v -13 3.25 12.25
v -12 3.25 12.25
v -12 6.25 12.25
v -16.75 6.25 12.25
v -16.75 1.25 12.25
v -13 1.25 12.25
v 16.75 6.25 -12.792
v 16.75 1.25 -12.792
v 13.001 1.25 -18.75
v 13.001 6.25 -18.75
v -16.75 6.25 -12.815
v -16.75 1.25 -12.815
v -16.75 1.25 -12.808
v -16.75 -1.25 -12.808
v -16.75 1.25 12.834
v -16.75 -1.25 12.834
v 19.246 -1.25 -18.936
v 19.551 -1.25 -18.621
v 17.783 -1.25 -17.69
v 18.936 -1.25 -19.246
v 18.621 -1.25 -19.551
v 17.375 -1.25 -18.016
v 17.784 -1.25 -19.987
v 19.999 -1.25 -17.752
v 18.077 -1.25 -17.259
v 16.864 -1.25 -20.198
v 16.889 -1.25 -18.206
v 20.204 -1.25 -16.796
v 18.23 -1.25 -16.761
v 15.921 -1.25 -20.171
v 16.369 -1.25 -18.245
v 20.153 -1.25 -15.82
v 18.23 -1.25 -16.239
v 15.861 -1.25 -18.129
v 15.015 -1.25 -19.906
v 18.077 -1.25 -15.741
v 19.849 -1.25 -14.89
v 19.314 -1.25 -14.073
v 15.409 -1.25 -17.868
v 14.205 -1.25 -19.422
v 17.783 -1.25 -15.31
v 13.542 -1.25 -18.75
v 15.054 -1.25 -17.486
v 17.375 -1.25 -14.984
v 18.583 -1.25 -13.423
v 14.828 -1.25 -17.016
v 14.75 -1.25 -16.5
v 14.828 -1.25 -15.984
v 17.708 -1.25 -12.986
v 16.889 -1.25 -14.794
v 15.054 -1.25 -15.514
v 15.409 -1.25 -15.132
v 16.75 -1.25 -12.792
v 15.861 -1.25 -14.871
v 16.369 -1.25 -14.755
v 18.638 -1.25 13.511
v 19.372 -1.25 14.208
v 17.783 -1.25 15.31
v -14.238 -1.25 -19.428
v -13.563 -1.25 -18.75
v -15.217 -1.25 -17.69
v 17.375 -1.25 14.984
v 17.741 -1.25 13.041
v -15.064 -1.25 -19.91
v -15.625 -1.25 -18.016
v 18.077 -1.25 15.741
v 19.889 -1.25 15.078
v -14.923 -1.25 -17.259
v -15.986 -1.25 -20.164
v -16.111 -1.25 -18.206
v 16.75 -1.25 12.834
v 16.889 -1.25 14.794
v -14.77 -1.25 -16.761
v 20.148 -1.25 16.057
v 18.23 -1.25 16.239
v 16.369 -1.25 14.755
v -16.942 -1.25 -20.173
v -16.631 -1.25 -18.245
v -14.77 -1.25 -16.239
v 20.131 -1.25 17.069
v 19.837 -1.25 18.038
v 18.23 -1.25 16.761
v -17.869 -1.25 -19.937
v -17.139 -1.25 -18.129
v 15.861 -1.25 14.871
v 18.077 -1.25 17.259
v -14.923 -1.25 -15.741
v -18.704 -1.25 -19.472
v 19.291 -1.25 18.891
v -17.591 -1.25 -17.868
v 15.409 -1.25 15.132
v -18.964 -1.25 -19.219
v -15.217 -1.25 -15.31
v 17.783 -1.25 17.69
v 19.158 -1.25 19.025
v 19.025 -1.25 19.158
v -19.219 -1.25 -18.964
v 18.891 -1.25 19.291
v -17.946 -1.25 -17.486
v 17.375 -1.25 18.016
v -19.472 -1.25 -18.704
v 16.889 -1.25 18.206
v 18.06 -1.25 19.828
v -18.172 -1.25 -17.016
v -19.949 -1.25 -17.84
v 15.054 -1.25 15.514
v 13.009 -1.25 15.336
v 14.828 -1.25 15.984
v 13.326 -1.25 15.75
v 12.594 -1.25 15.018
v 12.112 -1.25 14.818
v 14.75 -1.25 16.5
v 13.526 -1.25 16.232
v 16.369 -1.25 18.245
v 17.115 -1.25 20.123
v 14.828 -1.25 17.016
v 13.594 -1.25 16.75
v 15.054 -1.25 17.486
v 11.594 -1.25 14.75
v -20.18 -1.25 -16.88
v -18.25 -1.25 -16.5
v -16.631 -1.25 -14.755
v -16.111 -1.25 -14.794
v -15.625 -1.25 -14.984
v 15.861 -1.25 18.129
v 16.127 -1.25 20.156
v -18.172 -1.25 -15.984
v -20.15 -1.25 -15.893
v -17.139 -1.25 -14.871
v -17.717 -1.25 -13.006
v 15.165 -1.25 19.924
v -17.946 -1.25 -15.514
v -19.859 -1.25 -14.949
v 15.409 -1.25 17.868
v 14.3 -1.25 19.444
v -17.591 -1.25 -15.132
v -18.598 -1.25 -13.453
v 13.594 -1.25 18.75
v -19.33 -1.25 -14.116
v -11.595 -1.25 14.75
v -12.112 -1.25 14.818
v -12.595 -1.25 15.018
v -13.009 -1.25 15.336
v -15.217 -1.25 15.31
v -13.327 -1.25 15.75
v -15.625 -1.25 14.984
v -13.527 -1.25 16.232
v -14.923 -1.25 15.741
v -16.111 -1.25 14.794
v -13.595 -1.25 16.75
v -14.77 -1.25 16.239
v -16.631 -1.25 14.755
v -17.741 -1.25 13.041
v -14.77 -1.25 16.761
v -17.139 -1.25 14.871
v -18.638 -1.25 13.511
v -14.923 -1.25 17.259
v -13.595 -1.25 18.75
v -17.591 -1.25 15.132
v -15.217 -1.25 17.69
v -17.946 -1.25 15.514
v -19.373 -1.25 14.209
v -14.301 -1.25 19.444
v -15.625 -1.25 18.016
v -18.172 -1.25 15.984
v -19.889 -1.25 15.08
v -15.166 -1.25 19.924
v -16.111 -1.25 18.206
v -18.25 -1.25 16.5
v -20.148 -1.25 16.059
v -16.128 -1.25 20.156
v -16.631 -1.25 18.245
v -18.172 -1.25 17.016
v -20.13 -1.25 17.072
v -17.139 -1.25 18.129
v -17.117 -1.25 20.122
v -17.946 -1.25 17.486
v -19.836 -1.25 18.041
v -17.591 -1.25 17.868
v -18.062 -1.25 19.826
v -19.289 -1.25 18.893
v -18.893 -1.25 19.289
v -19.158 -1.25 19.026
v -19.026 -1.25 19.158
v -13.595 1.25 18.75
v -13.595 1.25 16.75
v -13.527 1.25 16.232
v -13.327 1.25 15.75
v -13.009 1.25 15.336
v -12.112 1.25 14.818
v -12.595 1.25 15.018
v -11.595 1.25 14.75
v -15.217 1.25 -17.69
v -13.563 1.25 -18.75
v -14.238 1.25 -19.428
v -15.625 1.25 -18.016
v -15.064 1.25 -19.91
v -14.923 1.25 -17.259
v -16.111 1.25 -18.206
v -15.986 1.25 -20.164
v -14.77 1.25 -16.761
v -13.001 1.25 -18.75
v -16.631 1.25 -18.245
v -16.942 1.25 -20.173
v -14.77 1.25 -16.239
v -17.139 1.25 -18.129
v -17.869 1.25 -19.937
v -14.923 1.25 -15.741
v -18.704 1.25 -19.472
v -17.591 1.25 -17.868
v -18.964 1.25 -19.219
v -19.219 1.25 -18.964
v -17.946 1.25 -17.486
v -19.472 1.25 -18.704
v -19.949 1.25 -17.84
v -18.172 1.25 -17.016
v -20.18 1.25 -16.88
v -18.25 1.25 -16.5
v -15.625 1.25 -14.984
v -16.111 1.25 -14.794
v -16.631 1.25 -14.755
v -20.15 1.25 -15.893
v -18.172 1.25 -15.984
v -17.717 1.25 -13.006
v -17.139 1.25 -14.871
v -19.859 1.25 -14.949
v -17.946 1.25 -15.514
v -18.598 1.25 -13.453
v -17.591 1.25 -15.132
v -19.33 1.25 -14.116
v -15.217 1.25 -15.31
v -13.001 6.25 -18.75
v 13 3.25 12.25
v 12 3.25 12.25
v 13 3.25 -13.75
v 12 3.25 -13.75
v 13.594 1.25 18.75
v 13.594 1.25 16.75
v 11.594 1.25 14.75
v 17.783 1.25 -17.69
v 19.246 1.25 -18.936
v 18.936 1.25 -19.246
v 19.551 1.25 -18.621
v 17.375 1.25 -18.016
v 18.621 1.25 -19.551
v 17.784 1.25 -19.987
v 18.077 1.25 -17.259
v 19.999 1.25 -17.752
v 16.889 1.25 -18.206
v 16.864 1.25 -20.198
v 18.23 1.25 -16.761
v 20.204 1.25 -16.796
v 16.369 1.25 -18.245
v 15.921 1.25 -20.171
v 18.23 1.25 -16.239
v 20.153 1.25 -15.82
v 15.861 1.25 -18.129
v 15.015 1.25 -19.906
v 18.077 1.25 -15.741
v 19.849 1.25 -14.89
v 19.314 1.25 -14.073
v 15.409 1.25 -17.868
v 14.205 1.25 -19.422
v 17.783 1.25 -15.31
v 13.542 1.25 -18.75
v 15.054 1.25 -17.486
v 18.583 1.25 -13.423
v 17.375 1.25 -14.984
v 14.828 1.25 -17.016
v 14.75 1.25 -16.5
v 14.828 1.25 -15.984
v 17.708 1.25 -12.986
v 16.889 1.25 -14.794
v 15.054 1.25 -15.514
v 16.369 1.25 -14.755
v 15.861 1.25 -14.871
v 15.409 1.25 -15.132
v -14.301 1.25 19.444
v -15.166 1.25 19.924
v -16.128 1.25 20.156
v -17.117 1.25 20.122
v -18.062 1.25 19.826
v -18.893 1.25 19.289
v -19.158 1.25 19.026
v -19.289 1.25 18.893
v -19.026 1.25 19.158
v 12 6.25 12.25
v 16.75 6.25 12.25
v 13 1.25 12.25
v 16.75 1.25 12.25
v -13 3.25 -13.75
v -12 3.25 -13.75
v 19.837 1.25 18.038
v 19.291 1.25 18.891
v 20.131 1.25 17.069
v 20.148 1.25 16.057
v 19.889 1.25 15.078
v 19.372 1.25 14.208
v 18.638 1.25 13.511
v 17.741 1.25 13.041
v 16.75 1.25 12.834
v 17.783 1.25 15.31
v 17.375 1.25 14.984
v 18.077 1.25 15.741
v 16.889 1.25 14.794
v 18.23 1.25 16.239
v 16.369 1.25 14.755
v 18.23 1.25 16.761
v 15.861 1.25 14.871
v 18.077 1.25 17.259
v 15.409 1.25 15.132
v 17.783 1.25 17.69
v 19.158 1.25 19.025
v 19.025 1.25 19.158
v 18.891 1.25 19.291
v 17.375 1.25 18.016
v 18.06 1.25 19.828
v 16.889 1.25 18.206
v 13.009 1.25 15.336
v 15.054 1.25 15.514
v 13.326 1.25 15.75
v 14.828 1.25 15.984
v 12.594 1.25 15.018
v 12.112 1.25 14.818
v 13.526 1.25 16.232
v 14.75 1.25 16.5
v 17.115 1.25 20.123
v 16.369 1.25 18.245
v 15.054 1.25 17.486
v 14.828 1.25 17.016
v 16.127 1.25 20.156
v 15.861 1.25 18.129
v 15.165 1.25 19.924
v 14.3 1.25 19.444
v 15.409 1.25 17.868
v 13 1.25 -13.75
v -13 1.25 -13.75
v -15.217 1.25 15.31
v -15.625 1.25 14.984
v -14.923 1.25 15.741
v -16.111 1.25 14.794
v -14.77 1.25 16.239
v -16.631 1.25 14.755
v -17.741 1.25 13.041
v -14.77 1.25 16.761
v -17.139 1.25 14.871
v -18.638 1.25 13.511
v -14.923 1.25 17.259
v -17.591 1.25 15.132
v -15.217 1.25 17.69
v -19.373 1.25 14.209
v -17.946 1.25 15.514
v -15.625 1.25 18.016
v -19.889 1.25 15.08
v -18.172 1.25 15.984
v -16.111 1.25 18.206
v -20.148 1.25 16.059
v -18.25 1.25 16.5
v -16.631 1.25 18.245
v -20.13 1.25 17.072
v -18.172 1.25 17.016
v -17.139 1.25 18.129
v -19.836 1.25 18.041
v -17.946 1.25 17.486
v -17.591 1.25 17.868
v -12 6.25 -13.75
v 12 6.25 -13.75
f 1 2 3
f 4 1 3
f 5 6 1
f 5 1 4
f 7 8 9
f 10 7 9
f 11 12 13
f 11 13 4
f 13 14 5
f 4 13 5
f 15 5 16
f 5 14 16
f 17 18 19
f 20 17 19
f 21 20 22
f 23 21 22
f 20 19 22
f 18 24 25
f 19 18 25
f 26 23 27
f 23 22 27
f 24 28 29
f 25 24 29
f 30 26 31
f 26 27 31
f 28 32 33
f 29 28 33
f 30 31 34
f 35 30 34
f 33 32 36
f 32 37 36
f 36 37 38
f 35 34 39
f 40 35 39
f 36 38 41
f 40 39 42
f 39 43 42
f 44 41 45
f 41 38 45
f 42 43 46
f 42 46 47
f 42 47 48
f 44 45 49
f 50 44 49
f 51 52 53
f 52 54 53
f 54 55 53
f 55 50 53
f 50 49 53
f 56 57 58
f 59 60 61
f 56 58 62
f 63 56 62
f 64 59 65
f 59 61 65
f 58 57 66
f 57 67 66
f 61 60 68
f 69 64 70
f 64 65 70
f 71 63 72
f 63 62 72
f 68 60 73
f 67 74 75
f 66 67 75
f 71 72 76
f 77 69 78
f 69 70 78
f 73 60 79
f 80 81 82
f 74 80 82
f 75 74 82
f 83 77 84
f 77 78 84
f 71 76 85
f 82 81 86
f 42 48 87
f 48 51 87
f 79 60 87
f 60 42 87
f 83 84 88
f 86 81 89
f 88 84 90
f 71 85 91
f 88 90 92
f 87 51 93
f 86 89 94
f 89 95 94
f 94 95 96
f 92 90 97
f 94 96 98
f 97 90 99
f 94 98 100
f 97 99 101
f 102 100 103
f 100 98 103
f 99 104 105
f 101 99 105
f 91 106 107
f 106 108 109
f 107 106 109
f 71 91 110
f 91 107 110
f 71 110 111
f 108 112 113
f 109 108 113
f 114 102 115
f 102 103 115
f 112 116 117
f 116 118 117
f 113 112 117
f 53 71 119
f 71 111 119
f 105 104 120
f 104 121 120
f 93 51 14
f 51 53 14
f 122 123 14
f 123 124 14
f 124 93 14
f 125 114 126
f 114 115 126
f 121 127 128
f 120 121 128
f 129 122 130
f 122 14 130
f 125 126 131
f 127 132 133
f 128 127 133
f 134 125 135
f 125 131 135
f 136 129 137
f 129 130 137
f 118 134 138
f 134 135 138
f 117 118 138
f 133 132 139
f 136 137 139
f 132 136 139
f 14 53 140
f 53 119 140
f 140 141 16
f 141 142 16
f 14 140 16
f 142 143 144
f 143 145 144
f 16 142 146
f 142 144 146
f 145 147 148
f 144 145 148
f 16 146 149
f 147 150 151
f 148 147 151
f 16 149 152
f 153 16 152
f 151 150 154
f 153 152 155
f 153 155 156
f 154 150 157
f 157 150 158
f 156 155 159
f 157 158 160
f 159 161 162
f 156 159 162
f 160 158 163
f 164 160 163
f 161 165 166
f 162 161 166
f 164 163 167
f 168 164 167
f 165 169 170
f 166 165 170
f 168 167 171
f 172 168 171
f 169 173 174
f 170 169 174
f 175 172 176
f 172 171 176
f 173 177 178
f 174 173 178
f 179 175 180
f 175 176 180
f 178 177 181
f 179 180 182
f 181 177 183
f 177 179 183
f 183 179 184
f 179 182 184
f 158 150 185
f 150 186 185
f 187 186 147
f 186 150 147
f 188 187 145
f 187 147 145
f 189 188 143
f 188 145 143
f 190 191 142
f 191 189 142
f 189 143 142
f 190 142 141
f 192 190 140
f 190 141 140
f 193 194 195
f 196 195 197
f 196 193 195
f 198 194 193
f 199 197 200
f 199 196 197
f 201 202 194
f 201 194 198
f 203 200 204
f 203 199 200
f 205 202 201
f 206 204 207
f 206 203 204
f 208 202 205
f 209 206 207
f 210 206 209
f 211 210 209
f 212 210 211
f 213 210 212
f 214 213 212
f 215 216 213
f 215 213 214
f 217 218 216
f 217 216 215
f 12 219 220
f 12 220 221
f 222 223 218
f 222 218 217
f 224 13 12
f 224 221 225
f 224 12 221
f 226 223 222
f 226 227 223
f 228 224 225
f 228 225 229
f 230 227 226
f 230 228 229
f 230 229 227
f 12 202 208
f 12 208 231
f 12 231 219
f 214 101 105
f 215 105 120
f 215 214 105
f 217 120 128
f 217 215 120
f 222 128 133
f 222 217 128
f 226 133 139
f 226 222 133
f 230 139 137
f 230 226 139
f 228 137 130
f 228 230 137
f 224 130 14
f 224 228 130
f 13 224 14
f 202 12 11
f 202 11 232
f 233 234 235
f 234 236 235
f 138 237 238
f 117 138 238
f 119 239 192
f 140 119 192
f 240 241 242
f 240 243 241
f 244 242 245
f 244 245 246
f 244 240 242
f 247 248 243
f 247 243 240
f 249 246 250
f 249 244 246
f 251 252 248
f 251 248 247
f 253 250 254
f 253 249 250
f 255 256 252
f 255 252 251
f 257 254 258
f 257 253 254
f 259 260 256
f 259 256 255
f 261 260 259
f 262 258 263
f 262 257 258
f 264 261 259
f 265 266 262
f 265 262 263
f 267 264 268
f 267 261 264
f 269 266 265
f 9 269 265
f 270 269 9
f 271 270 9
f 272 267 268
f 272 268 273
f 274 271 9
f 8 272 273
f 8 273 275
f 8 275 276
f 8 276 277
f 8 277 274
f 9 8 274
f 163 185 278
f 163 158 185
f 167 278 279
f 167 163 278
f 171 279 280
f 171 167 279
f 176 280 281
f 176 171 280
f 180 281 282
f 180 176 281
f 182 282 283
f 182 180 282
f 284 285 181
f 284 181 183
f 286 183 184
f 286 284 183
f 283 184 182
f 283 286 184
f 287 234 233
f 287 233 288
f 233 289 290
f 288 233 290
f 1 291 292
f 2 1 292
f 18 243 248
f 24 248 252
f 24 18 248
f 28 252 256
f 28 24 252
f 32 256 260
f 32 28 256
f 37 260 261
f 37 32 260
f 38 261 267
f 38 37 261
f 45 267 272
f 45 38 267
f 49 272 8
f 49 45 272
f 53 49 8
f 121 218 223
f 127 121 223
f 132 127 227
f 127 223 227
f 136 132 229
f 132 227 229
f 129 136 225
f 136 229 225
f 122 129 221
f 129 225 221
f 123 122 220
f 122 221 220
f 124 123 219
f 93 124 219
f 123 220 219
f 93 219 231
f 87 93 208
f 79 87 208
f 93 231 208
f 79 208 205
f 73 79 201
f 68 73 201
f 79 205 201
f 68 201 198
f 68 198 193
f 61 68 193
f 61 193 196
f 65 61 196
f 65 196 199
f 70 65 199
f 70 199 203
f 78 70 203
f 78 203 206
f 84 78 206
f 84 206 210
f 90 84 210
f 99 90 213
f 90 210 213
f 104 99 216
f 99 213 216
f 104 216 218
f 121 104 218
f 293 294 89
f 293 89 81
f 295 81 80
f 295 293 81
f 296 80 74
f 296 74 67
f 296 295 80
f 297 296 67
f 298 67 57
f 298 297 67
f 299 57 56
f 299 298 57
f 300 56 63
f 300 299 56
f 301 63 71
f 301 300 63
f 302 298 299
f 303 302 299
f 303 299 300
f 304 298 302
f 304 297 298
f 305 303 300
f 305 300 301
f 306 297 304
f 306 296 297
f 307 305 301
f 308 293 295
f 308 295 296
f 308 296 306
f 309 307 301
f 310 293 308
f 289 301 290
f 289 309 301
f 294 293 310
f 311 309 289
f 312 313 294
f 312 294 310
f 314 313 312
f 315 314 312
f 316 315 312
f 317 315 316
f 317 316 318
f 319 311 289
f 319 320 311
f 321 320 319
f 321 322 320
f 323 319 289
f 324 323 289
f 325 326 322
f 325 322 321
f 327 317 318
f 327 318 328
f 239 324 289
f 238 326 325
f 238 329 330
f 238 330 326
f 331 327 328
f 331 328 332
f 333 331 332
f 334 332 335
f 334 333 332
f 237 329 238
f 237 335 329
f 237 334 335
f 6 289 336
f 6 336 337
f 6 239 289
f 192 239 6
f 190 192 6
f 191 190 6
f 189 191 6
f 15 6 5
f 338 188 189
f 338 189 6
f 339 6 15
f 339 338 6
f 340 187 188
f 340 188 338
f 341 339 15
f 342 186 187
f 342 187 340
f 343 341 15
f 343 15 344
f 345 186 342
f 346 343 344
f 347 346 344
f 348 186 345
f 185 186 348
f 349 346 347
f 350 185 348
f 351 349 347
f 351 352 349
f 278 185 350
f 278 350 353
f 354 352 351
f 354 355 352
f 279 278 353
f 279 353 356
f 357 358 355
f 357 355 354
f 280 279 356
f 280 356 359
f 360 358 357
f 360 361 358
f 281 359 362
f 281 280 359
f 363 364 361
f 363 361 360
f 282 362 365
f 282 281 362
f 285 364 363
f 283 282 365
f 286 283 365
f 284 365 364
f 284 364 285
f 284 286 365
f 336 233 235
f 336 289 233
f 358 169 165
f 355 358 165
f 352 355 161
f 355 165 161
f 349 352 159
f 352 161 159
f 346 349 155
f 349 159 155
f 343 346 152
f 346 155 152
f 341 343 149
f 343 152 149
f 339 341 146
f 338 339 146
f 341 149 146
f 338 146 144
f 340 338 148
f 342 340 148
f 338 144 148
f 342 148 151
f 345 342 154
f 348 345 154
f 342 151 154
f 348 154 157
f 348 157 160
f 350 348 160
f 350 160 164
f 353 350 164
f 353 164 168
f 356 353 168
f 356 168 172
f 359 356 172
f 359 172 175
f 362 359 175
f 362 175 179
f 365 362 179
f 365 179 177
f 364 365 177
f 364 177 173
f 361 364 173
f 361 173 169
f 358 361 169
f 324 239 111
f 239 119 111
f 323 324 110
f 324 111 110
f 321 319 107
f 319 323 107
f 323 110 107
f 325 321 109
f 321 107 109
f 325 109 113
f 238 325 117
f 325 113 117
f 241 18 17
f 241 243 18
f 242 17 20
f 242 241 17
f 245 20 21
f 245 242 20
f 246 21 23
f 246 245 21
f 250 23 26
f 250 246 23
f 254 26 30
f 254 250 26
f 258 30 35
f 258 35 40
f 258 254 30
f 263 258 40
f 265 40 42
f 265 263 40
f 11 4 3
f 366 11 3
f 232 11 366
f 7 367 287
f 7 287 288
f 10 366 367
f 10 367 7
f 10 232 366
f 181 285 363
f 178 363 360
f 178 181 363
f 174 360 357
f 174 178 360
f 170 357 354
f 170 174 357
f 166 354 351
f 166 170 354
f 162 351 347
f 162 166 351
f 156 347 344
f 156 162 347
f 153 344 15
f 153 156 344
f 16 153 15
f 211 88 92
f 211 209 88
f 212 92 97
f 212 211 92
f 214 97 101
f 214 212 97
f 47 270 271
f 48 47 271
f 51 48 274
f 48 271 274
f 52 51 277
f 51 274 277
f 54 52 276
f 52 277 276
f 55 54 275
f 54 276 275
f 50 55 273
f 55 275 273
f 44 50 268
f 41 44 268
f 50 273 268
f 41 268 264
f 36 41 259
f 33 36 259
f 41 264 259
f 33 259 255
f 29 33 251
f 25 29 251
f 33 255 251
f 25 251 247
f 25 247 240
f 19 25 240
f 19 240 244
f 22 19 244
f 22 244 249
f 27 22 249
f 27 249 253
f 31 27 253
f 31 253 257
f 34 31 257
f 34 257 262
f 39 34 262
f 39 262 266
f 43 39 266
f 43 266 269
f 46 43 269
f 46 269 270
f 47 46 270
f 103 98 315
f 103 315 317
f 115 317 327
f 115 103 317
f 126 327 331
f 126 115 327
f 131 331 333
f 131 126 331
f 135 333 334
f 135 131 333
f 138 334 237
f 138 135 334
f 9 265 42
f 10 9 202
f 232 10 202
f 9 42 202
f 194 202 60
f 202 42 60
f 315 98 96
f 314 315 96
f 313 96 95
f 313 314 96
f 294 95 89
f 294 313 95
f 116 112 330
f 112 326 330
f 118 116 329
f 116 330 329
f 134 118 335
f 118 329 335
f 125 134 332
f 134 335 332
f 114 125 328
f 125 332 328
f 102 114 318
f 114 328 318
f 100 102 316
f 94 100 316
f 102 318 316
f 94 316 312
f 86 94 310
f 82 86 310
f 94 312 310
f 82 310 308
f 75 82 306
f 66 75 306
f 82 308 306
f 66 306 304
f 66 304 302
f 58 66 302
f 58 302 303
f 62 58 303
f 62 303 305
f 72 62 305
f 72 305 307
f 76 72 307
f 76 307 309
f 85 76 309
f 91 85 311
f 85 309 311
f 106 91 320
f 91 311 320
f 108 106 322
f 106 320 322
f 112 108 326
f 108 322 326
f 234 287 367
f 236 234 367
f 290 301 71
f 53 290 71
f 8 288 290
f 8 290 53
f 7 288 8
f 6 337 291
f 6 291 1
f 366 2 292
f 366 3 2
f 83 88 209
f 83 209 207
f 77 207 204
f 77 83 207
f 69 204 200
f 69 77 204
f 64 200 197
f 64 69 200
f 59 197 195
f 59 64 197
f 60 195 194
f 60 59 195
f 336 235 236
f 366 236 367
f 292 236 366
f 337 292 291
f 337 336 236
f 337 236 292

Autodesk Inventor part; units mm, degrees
ref_plane "YZ Plane" through (0, 0, 0) normal (1, 0, 0) x (0, 1, 0)
sketch "Skizze1" plane through (0, 0, 0) normal (0, 1, 0) x (-1, 0, 0)
  circle A0 centre (0, 0) radius 30
  circle A1 centre (0, 0) radius 27
  dimension "d0" = 60
  dimension "d1" = 54
extrude "Extrusion1" add sketch "Skizze1" along normal mid plane 10
sketch "Skizze5" plane through (0, 0, 0) normal (0, 1, 0) x (-1, 0, 0)
  line L0 (12.75, -14.75) -> (-12.75, -14.75)
  line L1 (-12.75, -14.75) -> (-12.75, 14.75)
  line L2 (-12.75, 14.75) -> (12.75, 14.75)
  line L3 (12.75, 14.75) -> (12.75, -14.75)
  line L4 (49.4097, 0) -> (-52.5504, 0) construction
  line L5 (0, -53.7913) -> (0, 68.1535) construction
  line L6 (-16.75, -18.75) -> (16.75, -18.75)
  line L7 (16.75, -18.75) -> (16.75, 18.75)
  line L8 (16.75, 18.75) -> (-16.75, 18.75)
  line L9 (-16.75, 18.75) -> (-16.75, -18.75)
  point P0 (0, 0)
  dimension "d33" = 29.5
  dimension "d34" = 25.5
  dimension "d35" = 4
extrude "Extrusion5" add sketch "Skizze5" along normal mid plane 2.5 contours L0 L1 L2 L3 | L9 L8 L7 L6
ref_plane "Arbeitsebene1" through (0, 0, 0) normal (0, 1, 0) x (-1, 0, 0)
chamfer "Fase1" distance 1 angle 45 2 edges at (30, 5, 0) (30, -5, 0)
sketch "Skizze2" plane through (0, 0, 0) normal (0, 1, 0) x (-1, 0, 0)
  line L0 (0, 42.2301) -> (0, -36.7007) construction
  line L1 (32.6355, 0) -> (-32.6355, 0) construction
  line L2 (16.5, 34.419) -> (16.5, -40.3324) construction
  line L3 (-16.5, 35.4304) -> (-16.5, -34.8157) construction
  line L4 (23.5881, 16.5) -> (-32.0387, 16.5) construction
  line L5 (23.5881, -16.5) -> (-39.8541, -16.5) construction
  circle A0 centre (16.5, -16.5) radius 1.75
  circle A1 centre (16.5, 16.5) radius 1.75
  circle A2 centre (-16.5, 16.5) radius 1.75
  circle A3 centre (-16.5, -16.5) radius 1.75
  circle A4 centre (-16.5, 16.5) radius 3.6749
  circle A5 centre (-16.5, -16.5) radius 3.7161
  circle A6 centre (16.5, -16.5) radius 3.7
  circle A7 centre (16.5, 16.5) radius 3.6747
  point P0 (0, 0)
  dimension "d8" = 33
  dimension "d9" = 33
  dimension "d10" = 3.5
  dimension "d11" = 3.5
  dimension "d12" = 3.5
  dimension "d13" = 3.5
extrude "Extrusion2" add sketch "Skizze2" along normal mid plane 2.5
ref_plane "Arbeitsebene2" through (0, 0, -30.5) normal (0, 0, 1) x (1, 0, 0)
extrude "Extrusion6" cut sketch "Skizze2" against normal mid plane 3 contours A0 | A1 | A2 | A3
sketch "Skizze12" plane through (0, 5, 0) normal (0, 1, 0) x (1, 0, 0)
  circle A0 centre (0, 0) radius 27
  circle A1 centre (0, 0) radius 31.5802
extrude "Extrusion13" cut sketch "Skizze12" against normal blind 10
sketch "Skizze13" plane through (0, 1.25, 0) normal (0, 1, 0) x (1, 0, 0)
  line L0 (-13.5947, -18.75) -> (13.5944, -18.75) projected
  line L1 (-13.5947, -18.75) -> (13.5944, -18.75)
  line L2 (13.5944, -18.75) -> (13.5944, -14.75)
  line L3 (13.5944, -14.75) -> (-13.5947, -14.75)
  line L4 (-13.5947, -14.75) -> (-13.5947, -18.75)
  point P0 (0, 0)
  dimension "d58" = 4
extrude "Extrusion14" cut sketch "Skizze13" against normal blind 3
fillet "Rundung4" radius 2 2 edges at (13.5944, 0, 14.75) (-13.5947, 0, 14.75)
sketch "Skizze14" plane through (0, 1.25, 0) normal (0, 1, 0) x (1, 0, 0)
  line L0 (-13, -12.25) -> (13, -12.25)
  line L1 (13, -12.25) -> (13, 13.75)
  line L2 (13, 13.75) -> (-13, 13.75)
  line L3 (-13, 13.75) -> (-13, -12.25)
  line L4 (0, -43.7267) -> (0, 49.5069) construction
  line L5 (-24.7381, 0) -> (29.5694, 0) construction
  line L6 (13.5425, 18.75) -> (-13.5627, 18.75) construction
  line L7 (-13, -12.25) -> (-16.75, -12.25)
  line L8 (-16.75, 12.8084) -> (-16.75, -12.8338) projected
  line L9 (-16.75, -12.25) -> (-16.75, 12.815)
  line L10 (-16.75, 12.815) -> (-13.0013, 18.75)
  line L11 (13, -12.25) -> (16.75, -12.25)
  line L12 (16.75, -12.8336) -> (16.75, 12.7924) projected
  arc A0 (16.75, 12.7924) -> (19.551, 18.6215) centre (16.5, 16.5) ccw projected
  line L13 (16.75, -12.25) -> (16.75, 12.7924)
  line L14 (16.75, 12.7924) -> (13.0013, 18.75)
  line L15 (13.0013, 18.75) -> (-13.0013, 18.75)
  point P0 (0, 0)
  dimension "d62" = 26
  dimension "d63" = 26
  dimension "d64" = 5
extrude "Extrusion15" add sketch "Skizze14" along normal blind 5 contours L7 L8 L9 L10 L15 L14 L12 L11 L1 L2 L3
sketch "Skizze15" plane through (0, 6.25, 0) normal (0, 1, 0) x (1, 0, 0)
  line L0 (-13, 13.75) -> (-13, -12.25) projected
  line L1 (13, 13.75) -> (-13, 13.75) projected
  line L2 (-13, -12.25) -> (-12, -12.25)
  line L3 (-12, -12.25) -> (-12, 13.75)
  line L4 (-12, 13.75) -> (-13, 13.75)
  line L5 (-13, 13.75) -> (-13, -12.25)
  line L6 (13, -12.25) -> (16.75, -12.25) projected
  line L7 (13, -12.25) -> (12, -12.25)
  line L8 (12, -12.25) -> (12, 13.75)
  line L9 (12, 13.75) -> (13, 13.75)
  line L10 (13, 13.75) -> (13, -12.25)
  point P0 (0, 0)
  dimension "d67" = 1
  dimension "d68" = 1
extrude "Extrusion16" add sketch "Skizze15" against normal blind 3
properties part number "_3D-Druck"
